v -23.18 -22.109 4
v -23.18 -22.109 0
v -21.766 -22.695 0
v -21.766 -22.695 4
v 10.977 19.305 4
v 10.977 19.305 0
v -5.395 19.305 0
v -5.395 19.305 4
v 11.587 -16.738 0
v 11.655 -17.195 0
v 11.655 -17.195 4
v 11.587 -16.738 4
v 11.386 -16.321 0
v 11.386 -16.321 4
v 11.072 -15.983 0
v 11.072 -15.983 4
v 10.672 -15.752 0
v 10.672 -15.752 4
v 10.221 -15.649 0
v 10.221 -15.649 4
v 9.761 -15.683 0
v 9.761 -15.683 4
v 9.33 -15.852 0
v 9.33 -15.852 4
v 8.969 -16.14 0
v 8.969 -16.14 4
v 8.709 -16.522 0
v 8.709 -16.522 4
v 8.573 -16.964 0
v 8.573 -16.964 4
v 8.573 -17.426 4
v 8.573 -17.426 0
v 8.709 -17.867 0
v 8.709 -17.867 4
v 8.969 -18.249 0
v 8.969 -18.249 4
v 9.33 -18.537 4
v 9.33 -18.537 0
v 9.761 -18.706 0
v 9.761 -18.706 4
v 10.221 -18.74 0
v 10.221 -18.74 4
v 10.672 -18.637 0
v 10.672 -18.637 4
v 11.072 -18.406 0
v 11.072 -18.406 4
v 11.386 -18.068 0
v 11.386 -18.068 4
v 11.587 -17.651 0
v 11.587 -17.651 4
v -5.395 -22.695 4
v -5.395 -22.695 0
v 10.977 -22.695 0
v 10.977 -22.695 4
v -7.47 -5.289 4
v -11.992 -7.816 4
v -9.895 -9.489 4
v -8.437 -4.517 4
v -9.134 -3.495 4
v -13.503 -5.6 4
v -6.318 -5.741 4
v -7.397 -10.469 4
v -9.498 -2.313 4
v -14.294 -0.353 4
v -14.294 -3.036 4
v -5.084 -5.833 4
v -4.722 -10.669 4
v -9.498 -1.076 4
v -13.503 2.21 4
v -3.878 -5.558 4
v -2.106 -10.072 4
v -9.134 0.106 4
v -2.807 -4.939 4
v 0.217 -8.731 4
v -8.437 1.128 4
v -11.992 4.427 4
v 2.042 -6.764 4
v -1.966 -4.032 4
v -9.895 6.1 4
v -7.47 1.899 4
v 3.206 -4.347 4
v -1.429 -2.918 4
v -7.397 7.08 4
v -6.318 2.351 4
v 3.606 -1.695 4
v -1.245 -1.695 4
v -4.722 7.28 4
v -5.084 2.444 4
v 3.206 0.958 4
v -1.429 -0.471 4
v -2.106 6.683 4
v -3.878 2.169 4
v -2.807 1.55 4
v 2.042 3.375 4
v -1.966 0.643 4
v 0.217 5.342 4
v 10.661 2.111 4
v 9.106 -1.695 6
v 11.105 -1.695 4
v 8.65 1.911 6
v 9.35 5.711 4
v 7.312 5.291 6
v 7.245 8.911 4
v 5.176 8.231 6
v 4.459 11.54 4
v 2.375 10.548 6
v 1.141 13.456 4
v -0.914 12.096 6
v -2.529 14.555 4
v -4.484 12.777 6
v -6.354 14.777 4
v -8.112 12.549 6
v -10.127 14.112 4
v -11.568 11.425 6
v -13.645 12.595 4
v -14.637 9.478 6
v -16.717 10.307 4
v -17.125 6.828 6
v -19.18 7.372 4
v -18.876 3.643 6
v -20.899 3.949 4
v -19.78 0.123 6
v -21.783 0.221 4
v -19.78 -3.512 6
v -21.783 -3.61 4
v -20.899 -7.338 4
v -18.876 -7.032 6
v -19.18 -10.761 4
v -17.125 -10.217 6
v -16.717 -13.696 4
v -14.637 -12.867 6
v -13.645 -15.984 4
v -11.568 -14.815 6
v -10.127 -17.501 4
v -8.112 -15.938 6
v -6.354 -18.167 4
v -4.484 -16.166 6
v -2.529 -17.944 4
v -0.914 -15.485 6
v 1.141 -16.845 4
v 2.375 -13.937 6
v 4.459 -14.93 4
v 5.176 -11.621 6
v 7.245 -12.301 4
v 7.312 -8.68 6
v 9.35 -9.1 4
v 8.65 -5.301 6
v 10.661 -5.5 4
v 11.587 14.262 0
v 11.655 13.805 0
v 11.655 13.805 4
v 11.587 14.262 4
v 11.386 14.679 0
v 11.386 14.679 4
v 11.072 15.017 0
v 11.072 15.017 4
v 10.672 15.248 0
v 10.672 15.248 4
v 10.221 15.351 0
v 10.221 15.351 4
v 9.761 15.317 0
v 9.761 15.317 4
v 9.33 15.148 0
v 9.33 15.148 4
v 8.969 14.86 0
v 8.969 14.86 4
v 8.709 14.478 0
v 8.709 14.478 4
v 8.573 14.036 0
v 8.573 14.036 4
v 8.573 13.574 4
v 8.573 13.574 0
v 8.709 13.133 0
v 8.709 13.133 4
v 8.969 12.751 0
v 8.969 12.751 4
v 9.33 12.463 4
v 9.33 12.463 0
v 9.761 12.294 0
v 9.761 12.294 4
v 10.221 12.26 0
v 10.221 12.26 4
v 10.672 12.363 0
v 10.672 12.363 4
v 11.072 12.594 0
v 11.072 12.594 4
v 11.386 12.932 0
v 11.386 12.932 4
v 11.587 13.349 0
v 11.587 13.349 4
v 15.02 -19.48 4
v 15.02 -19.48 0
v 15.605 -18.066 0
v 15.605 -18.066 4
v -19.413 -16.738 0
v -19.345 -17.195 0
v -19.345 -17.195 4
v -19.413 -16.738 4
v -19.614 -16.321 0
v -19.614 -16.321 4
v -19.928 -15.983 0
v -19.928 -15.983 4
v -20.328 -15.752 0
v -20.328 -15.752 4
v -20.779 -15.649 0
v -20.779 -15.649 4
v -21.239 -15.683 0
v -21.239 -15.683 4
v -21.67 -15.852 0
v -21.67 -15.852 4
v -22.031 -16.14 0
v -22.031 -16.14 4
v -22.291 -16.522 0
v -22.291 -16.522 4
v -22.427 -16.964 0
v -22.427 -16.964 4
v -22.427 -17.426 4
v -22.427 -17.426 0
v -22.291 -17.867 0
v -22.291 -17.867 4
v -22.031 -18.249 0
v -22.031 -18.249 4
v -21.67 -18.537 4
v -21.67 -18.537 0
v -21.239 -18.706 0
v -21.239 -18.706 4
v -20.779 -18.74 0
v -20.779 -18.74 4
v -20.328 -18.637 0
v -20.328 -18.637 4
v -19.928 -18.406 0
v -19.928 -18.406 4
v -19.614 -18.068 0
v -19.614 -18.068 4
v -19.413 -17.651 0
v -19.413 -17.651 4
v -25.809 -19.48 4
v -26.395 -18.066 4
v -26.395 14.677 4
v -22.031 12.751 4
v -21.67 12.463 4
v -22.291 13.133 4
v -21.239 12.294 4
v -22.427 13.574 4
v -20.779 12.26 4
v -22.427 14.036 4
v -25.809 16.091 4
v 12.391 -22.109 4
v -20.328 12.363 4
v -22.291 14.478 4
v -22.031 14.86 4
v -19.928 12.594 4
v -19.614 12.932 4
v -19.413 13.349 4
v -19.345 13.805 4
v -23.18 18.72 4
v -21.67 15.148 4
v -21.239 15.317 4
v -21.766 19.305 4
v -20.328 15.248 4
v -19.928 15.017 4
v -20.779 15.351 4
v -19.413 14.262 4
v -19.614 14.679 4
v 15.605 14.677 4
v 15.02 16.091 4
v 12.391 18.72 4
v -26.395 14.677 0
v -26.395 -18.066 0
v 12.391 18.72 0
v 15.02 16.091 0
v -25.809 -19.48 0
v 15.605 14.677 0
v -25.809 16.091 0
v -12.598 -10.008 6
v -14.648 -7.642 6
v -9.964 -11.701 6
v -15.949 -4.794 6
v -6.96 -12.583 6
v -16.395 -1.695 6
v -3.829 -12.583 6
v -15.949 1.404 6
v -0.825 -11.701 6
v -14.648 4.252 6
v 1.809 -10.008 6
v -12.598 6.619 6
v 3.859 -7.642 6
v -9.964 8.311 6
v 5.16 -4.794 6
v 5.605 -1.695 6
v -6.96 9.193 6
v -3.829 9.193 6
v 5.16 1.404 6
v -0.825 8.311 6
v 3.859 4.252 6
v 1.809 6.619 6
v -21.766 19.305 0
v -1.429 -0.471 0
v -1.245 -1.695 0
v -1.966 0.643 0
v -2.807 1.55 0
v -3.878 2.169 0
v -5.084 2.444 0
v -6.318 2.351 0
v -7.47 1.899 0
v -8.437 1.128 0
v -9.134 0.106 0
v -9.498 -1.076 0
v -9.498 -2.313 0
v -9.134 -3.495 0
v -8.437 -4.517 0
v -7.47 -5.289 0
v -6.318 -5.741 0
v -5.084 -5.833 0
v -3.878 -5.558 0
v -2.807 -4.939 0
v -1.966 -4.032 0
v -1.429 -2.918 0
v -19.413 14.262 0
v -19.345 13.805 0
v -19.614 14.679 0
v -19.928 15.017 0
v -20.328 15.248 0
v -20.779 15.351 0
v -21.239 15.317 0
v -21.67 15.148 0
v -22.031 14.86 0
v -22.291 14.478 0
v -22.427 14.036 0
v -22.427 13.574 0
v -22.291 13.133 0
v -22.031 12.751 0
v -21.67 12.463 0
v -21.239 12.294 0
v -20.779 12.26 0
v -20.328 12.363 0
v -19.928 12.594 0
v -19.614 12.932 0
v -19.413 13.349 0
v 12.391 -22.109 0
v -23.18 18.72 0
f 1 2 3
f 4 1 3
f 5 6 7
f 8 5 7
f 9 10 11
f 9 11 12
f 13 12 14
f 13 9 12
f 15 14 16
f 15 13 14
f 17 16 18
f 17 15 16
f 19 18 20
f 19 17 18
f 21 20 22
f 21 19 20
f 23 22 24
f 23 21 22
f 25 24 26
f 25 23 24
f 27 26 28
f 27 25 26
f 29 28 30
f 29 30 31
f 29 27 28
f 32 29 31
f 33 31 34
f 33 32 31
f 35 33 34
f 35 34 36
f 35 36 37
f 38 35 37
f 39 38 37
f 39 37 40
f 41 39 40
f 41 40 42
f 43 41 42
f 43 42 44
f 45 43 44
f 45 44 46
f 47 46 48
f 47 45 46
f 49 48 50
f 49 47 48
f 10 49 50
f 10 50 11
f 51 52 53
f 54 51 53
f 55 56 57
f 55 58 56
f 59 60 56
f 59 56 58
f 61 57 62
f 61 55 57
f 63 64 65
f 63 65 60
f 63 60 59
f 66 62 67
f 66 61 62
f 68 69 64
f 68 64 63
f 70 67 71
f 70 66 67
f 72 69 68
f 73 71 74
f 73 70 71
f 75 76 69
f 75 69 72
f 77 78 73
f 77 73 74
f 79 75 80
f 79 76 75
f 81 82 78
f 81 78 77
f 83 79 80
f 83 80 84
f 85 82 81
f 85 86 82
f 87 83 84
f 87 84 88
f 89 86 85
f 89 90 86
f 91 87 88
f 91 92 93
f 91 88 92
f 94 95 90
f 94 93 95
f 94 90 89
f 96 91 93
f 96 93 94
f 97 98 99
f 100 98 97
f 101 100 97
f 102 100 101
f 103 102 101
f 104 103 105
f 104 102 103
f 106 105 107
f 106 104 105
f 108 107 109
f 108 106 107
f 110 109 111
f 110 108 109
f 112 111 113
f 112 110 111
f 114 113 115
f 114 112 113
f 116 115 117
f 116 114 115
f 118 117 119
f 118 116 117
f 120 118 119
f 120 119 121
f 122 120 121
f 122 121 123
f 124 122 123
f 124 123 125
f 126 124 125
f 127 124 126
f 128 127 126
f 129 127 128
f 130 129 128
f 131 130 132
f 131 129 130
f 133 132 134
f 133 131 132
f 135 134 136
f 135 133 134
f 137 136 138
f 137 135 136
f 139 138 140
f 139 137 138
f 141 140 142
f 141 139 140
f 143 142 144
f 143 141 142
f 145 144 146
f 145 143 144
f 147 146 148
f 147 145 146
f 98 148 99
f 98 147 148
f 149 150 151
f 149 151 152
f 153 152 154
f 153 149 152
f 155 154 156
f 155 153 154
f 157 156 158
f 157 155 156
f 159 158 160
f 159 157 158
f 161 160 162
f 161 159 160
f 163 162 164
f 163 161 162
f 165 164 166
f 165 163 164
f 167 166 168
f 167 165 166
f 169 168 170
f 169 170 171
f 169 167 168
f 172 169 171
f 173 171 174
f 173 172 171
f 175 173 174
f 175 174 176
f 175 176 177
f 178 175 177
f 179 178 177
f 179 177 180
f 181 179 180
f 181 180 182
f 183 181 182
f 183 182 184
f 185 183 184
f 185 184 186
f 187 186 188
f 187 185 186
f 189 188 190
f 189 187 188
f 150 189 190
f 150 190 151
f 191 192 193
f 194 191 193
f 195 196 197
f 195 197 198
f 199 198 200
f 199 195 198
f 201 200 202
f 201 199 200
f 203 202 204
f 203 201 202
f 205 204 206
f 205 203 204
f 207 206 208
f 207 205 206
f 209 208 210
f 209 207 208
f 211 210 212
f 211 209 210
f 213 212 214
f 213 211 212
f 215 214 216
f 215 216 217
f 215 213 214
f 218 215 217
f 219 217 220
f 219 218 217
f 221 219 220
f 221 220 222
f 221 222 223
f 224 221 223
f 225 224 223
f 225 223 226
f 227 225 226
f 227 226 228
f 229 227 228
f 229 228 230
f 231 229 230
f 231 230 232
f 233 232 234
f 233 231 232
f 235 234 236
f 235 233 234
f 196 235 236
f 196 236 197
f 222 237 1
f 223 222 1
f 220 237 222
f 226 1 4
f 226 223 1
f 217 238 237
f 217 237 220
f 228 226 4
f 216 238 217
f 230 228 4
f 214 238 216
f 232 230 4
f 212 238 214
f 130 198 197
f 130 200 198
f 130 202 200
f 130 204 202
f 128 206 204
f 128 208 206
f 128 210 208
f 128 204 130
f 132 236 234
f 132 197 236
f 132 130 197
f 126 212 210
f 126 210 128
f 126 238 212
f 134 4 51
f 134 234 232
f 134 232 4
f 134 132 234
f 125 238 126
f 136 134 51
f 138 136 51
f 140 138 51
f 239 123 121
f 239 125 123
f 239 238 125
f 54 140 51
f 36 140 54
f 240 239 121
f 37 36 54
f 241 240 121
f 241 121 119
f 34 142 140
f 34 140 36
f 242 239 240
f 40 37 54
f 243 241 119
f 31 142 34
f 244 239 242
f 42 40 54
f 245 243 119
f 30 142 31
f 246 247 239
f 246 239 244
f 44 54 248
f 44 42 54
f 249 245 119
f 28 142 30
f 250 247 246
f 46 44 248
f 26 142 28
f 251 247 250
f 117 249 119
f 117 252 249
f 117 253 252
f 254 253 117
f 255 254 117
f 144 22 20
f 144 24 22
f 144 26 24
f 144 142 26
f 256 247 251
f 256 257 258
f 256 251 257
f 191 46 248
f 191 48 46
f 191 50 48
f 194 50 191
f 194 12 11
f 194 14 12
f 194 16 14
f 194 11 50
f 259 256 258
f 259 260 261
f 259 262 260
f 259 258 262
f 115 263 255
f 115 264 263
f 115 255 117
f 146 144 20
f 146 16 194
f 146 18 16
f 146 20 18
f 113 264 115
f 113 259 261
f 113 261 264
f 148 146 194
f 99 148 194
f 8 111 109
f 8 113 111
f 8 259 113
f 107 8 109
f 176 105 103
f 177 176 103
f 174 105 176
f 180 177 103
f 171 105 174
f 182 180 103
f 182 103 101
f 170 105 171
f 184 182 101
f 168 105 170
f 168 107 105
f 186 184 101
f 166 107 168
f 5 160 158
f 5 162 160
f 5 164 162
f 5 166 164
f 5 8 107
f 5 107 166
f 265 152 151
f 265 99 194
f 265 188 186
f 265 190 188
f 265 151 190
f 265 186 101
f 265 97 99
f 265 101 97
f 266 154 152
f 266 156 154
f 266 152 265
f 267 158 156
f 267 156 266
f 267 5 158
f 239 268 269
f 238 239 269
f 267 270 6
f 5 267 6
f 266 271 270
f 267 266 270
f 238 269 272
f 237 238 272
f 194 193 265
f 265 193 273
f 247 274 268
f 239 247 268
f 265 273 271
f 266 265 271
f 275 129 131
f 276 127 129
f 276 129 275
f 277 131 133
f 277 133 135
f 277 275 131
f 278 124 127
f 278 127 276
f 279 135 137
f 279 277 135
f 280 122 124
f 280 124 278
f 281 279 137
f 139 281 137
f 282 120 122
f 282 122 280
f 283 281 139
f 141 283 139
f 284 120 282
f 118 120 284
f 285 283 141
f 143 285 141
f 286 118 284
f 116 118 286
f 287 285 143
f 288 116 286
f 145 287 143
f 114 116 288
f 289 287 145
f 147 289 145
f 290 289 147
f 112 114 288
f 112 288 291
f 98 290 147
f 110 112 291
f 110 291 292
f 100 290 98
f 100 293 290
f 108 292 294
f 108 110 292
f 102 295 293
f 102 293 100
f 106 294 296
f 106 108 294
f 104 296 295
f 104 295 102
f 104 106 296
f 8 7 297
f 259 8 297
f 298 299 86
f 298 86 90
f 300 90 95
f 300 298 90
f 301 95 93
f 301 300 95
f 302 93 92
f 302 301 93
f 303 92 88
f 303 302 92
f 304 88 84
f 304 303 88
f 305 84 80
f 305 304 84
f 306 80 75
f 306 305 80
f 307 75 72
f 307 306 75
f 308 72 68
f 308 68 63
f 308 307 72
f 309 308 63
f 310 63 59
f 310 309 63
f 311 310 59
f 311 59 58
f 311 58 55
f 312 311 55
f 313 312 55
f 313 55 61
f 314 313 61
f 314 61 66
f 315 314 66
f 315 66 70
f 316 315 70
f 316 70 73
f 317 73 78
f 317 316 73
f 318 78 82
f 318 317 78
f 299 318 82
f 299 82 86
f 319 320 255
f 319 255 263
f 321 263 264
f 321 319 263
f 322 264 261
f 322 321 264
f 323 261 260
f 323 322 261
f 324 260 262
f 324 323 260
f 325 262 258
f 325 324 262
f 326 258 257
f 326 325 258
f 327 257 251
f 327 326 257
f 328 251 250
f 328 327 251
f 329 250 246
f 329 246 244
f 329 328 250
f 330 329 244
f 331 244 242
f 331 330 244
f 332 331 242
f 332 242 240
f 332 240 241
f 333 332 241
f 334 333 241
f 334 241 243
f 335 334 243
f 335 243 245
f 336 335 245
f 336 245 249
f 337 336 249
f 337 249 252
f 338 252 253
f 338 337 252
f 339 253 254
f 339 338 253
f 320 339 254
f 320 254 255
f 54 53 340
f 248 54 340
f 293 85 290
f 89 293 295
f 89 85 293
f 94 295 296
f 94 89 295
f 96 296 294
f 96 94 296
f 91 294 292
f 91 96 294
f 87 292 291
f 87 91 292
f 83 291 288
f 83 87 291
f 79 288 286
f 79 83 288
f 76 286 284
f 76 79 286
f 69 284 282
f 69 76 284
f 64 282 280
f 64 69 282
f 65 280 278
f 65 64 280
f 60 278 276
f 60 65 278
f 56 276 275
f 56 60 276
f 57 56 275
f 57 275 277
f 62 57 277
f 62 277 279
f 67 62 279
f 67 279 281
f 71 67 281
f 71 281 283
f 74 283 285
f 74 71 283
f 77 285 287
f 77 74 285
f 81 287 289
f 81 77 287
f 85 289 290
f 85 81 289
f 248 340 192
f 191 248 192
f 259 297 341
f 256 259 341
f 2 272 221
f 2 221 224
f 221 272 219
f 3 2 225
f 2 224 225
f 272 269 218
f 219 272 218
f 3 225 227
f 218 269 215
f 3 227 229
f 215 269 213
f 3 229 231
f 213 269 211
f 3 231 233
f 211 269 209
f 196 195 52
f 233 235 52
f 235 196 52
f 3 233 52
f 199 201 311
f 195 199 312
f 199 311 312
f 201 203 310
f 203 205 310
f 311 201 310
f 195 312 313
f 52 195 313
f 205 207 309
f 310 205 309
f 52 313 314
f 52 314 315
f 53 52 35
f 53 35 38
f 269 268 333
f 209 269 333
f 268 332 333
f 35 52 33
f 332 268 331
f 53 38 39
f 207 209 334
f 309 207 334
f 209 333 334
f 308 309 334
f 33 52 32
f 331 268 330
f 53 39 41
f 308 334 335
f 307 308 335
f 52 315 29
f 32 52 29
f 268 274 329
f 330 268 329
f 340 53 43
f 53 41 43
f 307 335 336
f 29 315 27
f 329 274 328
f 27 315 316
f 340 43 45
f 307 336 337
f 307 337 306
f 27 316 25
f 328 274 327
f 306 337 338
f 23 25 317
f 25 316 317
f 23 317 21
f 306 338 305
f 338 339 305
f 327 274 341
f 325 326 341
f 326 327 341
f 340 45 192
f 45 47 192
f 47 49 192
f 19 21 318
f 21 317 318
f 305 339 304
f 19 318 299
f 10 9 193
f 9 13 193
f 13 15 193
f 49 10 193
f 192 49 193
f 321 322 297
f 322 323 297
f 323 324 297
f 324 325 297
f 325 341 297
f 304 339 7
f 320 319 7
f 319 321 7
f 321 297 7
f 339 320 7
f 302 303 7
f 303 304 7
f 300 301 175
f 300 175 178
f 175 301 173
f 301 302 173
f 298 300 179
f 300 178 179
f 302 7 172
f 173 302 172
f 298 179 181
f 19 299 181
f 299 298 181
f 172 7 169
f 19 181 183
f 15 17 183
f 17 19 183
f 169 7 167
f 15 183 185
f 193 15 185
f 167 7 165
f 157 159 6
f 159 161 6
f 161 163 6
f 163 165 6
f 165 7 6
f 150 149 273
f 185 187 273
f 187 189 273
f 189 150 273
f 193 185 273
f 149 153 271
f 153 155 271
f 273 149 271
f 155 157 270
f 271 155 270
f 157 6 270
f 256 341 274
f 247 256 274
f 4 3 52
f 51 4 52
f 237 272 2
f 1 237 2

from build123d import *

# Parameters (mm, degrees)
F0_R     = 1.55
F0_R_2   = 16.5
F0_R_3   = 11.0000000003
F0_R_4   = 4.1499999994
F1_DEPTH = 4
F2_R     = 16.5
F2_R_2   = 11.0000000003
F3_DEPTH = 2
F4_SIZE  = 1.99999
F5_SIZE  = 1.99999


# Not quite as in the source:
# - a fillet or chamfer is up to 0.001 mm smaller than in the source, because OpenCascade refuses the exact size


with BuildPart() as f1:
    # F0 (on Top) → F1 (new body)
    with BuildSketch(Plane.XY):
        Polygon((10.9770673246, 19.3054056901), (-5.3945055504, 19.3054056901), (-21.7660784254, 19.3054056904), (-23.1802919884, 18.7196192521), (-25.8087191127, 16.0911921274), (-26.3945055504, 14.6769785651), (-26.3945055504, -18.0661671849), (-25.8087191127, -19.4803807472), (-23.1802919884, -22.1088078719), (-21.7660784254, -22.6945943101), (-5.3945055504, -22.6945943099), (10.9770673246, -22.6945943084), (12.3912808869, -22.1088078705), (15.0197080109, -19.4803807465), (15.6054944488, -18.0661671842), (15.6054944488, 14.6769785659), (15.0197080109, 16.0911921281), (12.3912808869, 18.7196192521), align=None)
        with Locations((-20.8945055404, -17.1945943099)):
            Circle(F0_R, mode=Mode.SUBTRACT)
        with Locations((-5.3945055504, -1.6945943099)):
            Circle(F0_R_2, mode=Mode.SUBTRACT)
        with Locations((10.1054944396, -17.1945943099)):
            Circle(F0_R, mode=Mode.SUBTRACT)
        with Locations((-20.8945055501, 13.8054056901)):
            Circle(F0_R, mode=Mode.SUBTRACT)
        with Locations((10.1054944396, 13.8054056901)):
            Circle(F0_R, mode=Mode.SUBTRACT)
        with Locations((-5.3945055504, -1.6945943099)):
            Circle(F0_R_2)
        with Locations((-5.3945055504, -1.6945943099)):
            Circle(F0_R_3, mode=Mode.SUBTRACT)
        with Locations((-5.3945055504, -1.6945943099)):
            Circle(F0_R_3)
        with Locations((-5.3945055504, -1.6945943099)):
            Circle(F0_R_4, mode=Mode.SUBTRACT)
    extrude(amount=F1_DEPTH)

    # F2 (on face) → F3 (join)
    with BuildSketch(Plane.XY.offset(4)):
        with Locations((-5.3945055504, -1.6945943099)):
            Circle(F2_R)
        with Locations((-5.3945055504, -1.6945943099)):
            Circle(F2_R_2, mode=Mode.SUBTRACT)
    extrude(amount=F3_DEPTH)

    # F4 (size 2 in the source; OpenCascade refuses exactly that, so slightly less here)
    f4_edges = [f1.edges().sort_by_distance(p)[0] for p in [
        (-21.894506, -1.694594, 6),
    ]]
    chamfer(f4_edges, length=F4_SIZE)

    # F5 (size 2 in the source; OpenCascade refuses exactly that, so slightly less here)
    f5_edges = [f1.edges().sort_by_distance(p)[0] for p in [
        (-16.394506, -1.694594, 4),
    ]]
    chamfer(f5_edges, length=F5_SIZE)


solid = f1.part
